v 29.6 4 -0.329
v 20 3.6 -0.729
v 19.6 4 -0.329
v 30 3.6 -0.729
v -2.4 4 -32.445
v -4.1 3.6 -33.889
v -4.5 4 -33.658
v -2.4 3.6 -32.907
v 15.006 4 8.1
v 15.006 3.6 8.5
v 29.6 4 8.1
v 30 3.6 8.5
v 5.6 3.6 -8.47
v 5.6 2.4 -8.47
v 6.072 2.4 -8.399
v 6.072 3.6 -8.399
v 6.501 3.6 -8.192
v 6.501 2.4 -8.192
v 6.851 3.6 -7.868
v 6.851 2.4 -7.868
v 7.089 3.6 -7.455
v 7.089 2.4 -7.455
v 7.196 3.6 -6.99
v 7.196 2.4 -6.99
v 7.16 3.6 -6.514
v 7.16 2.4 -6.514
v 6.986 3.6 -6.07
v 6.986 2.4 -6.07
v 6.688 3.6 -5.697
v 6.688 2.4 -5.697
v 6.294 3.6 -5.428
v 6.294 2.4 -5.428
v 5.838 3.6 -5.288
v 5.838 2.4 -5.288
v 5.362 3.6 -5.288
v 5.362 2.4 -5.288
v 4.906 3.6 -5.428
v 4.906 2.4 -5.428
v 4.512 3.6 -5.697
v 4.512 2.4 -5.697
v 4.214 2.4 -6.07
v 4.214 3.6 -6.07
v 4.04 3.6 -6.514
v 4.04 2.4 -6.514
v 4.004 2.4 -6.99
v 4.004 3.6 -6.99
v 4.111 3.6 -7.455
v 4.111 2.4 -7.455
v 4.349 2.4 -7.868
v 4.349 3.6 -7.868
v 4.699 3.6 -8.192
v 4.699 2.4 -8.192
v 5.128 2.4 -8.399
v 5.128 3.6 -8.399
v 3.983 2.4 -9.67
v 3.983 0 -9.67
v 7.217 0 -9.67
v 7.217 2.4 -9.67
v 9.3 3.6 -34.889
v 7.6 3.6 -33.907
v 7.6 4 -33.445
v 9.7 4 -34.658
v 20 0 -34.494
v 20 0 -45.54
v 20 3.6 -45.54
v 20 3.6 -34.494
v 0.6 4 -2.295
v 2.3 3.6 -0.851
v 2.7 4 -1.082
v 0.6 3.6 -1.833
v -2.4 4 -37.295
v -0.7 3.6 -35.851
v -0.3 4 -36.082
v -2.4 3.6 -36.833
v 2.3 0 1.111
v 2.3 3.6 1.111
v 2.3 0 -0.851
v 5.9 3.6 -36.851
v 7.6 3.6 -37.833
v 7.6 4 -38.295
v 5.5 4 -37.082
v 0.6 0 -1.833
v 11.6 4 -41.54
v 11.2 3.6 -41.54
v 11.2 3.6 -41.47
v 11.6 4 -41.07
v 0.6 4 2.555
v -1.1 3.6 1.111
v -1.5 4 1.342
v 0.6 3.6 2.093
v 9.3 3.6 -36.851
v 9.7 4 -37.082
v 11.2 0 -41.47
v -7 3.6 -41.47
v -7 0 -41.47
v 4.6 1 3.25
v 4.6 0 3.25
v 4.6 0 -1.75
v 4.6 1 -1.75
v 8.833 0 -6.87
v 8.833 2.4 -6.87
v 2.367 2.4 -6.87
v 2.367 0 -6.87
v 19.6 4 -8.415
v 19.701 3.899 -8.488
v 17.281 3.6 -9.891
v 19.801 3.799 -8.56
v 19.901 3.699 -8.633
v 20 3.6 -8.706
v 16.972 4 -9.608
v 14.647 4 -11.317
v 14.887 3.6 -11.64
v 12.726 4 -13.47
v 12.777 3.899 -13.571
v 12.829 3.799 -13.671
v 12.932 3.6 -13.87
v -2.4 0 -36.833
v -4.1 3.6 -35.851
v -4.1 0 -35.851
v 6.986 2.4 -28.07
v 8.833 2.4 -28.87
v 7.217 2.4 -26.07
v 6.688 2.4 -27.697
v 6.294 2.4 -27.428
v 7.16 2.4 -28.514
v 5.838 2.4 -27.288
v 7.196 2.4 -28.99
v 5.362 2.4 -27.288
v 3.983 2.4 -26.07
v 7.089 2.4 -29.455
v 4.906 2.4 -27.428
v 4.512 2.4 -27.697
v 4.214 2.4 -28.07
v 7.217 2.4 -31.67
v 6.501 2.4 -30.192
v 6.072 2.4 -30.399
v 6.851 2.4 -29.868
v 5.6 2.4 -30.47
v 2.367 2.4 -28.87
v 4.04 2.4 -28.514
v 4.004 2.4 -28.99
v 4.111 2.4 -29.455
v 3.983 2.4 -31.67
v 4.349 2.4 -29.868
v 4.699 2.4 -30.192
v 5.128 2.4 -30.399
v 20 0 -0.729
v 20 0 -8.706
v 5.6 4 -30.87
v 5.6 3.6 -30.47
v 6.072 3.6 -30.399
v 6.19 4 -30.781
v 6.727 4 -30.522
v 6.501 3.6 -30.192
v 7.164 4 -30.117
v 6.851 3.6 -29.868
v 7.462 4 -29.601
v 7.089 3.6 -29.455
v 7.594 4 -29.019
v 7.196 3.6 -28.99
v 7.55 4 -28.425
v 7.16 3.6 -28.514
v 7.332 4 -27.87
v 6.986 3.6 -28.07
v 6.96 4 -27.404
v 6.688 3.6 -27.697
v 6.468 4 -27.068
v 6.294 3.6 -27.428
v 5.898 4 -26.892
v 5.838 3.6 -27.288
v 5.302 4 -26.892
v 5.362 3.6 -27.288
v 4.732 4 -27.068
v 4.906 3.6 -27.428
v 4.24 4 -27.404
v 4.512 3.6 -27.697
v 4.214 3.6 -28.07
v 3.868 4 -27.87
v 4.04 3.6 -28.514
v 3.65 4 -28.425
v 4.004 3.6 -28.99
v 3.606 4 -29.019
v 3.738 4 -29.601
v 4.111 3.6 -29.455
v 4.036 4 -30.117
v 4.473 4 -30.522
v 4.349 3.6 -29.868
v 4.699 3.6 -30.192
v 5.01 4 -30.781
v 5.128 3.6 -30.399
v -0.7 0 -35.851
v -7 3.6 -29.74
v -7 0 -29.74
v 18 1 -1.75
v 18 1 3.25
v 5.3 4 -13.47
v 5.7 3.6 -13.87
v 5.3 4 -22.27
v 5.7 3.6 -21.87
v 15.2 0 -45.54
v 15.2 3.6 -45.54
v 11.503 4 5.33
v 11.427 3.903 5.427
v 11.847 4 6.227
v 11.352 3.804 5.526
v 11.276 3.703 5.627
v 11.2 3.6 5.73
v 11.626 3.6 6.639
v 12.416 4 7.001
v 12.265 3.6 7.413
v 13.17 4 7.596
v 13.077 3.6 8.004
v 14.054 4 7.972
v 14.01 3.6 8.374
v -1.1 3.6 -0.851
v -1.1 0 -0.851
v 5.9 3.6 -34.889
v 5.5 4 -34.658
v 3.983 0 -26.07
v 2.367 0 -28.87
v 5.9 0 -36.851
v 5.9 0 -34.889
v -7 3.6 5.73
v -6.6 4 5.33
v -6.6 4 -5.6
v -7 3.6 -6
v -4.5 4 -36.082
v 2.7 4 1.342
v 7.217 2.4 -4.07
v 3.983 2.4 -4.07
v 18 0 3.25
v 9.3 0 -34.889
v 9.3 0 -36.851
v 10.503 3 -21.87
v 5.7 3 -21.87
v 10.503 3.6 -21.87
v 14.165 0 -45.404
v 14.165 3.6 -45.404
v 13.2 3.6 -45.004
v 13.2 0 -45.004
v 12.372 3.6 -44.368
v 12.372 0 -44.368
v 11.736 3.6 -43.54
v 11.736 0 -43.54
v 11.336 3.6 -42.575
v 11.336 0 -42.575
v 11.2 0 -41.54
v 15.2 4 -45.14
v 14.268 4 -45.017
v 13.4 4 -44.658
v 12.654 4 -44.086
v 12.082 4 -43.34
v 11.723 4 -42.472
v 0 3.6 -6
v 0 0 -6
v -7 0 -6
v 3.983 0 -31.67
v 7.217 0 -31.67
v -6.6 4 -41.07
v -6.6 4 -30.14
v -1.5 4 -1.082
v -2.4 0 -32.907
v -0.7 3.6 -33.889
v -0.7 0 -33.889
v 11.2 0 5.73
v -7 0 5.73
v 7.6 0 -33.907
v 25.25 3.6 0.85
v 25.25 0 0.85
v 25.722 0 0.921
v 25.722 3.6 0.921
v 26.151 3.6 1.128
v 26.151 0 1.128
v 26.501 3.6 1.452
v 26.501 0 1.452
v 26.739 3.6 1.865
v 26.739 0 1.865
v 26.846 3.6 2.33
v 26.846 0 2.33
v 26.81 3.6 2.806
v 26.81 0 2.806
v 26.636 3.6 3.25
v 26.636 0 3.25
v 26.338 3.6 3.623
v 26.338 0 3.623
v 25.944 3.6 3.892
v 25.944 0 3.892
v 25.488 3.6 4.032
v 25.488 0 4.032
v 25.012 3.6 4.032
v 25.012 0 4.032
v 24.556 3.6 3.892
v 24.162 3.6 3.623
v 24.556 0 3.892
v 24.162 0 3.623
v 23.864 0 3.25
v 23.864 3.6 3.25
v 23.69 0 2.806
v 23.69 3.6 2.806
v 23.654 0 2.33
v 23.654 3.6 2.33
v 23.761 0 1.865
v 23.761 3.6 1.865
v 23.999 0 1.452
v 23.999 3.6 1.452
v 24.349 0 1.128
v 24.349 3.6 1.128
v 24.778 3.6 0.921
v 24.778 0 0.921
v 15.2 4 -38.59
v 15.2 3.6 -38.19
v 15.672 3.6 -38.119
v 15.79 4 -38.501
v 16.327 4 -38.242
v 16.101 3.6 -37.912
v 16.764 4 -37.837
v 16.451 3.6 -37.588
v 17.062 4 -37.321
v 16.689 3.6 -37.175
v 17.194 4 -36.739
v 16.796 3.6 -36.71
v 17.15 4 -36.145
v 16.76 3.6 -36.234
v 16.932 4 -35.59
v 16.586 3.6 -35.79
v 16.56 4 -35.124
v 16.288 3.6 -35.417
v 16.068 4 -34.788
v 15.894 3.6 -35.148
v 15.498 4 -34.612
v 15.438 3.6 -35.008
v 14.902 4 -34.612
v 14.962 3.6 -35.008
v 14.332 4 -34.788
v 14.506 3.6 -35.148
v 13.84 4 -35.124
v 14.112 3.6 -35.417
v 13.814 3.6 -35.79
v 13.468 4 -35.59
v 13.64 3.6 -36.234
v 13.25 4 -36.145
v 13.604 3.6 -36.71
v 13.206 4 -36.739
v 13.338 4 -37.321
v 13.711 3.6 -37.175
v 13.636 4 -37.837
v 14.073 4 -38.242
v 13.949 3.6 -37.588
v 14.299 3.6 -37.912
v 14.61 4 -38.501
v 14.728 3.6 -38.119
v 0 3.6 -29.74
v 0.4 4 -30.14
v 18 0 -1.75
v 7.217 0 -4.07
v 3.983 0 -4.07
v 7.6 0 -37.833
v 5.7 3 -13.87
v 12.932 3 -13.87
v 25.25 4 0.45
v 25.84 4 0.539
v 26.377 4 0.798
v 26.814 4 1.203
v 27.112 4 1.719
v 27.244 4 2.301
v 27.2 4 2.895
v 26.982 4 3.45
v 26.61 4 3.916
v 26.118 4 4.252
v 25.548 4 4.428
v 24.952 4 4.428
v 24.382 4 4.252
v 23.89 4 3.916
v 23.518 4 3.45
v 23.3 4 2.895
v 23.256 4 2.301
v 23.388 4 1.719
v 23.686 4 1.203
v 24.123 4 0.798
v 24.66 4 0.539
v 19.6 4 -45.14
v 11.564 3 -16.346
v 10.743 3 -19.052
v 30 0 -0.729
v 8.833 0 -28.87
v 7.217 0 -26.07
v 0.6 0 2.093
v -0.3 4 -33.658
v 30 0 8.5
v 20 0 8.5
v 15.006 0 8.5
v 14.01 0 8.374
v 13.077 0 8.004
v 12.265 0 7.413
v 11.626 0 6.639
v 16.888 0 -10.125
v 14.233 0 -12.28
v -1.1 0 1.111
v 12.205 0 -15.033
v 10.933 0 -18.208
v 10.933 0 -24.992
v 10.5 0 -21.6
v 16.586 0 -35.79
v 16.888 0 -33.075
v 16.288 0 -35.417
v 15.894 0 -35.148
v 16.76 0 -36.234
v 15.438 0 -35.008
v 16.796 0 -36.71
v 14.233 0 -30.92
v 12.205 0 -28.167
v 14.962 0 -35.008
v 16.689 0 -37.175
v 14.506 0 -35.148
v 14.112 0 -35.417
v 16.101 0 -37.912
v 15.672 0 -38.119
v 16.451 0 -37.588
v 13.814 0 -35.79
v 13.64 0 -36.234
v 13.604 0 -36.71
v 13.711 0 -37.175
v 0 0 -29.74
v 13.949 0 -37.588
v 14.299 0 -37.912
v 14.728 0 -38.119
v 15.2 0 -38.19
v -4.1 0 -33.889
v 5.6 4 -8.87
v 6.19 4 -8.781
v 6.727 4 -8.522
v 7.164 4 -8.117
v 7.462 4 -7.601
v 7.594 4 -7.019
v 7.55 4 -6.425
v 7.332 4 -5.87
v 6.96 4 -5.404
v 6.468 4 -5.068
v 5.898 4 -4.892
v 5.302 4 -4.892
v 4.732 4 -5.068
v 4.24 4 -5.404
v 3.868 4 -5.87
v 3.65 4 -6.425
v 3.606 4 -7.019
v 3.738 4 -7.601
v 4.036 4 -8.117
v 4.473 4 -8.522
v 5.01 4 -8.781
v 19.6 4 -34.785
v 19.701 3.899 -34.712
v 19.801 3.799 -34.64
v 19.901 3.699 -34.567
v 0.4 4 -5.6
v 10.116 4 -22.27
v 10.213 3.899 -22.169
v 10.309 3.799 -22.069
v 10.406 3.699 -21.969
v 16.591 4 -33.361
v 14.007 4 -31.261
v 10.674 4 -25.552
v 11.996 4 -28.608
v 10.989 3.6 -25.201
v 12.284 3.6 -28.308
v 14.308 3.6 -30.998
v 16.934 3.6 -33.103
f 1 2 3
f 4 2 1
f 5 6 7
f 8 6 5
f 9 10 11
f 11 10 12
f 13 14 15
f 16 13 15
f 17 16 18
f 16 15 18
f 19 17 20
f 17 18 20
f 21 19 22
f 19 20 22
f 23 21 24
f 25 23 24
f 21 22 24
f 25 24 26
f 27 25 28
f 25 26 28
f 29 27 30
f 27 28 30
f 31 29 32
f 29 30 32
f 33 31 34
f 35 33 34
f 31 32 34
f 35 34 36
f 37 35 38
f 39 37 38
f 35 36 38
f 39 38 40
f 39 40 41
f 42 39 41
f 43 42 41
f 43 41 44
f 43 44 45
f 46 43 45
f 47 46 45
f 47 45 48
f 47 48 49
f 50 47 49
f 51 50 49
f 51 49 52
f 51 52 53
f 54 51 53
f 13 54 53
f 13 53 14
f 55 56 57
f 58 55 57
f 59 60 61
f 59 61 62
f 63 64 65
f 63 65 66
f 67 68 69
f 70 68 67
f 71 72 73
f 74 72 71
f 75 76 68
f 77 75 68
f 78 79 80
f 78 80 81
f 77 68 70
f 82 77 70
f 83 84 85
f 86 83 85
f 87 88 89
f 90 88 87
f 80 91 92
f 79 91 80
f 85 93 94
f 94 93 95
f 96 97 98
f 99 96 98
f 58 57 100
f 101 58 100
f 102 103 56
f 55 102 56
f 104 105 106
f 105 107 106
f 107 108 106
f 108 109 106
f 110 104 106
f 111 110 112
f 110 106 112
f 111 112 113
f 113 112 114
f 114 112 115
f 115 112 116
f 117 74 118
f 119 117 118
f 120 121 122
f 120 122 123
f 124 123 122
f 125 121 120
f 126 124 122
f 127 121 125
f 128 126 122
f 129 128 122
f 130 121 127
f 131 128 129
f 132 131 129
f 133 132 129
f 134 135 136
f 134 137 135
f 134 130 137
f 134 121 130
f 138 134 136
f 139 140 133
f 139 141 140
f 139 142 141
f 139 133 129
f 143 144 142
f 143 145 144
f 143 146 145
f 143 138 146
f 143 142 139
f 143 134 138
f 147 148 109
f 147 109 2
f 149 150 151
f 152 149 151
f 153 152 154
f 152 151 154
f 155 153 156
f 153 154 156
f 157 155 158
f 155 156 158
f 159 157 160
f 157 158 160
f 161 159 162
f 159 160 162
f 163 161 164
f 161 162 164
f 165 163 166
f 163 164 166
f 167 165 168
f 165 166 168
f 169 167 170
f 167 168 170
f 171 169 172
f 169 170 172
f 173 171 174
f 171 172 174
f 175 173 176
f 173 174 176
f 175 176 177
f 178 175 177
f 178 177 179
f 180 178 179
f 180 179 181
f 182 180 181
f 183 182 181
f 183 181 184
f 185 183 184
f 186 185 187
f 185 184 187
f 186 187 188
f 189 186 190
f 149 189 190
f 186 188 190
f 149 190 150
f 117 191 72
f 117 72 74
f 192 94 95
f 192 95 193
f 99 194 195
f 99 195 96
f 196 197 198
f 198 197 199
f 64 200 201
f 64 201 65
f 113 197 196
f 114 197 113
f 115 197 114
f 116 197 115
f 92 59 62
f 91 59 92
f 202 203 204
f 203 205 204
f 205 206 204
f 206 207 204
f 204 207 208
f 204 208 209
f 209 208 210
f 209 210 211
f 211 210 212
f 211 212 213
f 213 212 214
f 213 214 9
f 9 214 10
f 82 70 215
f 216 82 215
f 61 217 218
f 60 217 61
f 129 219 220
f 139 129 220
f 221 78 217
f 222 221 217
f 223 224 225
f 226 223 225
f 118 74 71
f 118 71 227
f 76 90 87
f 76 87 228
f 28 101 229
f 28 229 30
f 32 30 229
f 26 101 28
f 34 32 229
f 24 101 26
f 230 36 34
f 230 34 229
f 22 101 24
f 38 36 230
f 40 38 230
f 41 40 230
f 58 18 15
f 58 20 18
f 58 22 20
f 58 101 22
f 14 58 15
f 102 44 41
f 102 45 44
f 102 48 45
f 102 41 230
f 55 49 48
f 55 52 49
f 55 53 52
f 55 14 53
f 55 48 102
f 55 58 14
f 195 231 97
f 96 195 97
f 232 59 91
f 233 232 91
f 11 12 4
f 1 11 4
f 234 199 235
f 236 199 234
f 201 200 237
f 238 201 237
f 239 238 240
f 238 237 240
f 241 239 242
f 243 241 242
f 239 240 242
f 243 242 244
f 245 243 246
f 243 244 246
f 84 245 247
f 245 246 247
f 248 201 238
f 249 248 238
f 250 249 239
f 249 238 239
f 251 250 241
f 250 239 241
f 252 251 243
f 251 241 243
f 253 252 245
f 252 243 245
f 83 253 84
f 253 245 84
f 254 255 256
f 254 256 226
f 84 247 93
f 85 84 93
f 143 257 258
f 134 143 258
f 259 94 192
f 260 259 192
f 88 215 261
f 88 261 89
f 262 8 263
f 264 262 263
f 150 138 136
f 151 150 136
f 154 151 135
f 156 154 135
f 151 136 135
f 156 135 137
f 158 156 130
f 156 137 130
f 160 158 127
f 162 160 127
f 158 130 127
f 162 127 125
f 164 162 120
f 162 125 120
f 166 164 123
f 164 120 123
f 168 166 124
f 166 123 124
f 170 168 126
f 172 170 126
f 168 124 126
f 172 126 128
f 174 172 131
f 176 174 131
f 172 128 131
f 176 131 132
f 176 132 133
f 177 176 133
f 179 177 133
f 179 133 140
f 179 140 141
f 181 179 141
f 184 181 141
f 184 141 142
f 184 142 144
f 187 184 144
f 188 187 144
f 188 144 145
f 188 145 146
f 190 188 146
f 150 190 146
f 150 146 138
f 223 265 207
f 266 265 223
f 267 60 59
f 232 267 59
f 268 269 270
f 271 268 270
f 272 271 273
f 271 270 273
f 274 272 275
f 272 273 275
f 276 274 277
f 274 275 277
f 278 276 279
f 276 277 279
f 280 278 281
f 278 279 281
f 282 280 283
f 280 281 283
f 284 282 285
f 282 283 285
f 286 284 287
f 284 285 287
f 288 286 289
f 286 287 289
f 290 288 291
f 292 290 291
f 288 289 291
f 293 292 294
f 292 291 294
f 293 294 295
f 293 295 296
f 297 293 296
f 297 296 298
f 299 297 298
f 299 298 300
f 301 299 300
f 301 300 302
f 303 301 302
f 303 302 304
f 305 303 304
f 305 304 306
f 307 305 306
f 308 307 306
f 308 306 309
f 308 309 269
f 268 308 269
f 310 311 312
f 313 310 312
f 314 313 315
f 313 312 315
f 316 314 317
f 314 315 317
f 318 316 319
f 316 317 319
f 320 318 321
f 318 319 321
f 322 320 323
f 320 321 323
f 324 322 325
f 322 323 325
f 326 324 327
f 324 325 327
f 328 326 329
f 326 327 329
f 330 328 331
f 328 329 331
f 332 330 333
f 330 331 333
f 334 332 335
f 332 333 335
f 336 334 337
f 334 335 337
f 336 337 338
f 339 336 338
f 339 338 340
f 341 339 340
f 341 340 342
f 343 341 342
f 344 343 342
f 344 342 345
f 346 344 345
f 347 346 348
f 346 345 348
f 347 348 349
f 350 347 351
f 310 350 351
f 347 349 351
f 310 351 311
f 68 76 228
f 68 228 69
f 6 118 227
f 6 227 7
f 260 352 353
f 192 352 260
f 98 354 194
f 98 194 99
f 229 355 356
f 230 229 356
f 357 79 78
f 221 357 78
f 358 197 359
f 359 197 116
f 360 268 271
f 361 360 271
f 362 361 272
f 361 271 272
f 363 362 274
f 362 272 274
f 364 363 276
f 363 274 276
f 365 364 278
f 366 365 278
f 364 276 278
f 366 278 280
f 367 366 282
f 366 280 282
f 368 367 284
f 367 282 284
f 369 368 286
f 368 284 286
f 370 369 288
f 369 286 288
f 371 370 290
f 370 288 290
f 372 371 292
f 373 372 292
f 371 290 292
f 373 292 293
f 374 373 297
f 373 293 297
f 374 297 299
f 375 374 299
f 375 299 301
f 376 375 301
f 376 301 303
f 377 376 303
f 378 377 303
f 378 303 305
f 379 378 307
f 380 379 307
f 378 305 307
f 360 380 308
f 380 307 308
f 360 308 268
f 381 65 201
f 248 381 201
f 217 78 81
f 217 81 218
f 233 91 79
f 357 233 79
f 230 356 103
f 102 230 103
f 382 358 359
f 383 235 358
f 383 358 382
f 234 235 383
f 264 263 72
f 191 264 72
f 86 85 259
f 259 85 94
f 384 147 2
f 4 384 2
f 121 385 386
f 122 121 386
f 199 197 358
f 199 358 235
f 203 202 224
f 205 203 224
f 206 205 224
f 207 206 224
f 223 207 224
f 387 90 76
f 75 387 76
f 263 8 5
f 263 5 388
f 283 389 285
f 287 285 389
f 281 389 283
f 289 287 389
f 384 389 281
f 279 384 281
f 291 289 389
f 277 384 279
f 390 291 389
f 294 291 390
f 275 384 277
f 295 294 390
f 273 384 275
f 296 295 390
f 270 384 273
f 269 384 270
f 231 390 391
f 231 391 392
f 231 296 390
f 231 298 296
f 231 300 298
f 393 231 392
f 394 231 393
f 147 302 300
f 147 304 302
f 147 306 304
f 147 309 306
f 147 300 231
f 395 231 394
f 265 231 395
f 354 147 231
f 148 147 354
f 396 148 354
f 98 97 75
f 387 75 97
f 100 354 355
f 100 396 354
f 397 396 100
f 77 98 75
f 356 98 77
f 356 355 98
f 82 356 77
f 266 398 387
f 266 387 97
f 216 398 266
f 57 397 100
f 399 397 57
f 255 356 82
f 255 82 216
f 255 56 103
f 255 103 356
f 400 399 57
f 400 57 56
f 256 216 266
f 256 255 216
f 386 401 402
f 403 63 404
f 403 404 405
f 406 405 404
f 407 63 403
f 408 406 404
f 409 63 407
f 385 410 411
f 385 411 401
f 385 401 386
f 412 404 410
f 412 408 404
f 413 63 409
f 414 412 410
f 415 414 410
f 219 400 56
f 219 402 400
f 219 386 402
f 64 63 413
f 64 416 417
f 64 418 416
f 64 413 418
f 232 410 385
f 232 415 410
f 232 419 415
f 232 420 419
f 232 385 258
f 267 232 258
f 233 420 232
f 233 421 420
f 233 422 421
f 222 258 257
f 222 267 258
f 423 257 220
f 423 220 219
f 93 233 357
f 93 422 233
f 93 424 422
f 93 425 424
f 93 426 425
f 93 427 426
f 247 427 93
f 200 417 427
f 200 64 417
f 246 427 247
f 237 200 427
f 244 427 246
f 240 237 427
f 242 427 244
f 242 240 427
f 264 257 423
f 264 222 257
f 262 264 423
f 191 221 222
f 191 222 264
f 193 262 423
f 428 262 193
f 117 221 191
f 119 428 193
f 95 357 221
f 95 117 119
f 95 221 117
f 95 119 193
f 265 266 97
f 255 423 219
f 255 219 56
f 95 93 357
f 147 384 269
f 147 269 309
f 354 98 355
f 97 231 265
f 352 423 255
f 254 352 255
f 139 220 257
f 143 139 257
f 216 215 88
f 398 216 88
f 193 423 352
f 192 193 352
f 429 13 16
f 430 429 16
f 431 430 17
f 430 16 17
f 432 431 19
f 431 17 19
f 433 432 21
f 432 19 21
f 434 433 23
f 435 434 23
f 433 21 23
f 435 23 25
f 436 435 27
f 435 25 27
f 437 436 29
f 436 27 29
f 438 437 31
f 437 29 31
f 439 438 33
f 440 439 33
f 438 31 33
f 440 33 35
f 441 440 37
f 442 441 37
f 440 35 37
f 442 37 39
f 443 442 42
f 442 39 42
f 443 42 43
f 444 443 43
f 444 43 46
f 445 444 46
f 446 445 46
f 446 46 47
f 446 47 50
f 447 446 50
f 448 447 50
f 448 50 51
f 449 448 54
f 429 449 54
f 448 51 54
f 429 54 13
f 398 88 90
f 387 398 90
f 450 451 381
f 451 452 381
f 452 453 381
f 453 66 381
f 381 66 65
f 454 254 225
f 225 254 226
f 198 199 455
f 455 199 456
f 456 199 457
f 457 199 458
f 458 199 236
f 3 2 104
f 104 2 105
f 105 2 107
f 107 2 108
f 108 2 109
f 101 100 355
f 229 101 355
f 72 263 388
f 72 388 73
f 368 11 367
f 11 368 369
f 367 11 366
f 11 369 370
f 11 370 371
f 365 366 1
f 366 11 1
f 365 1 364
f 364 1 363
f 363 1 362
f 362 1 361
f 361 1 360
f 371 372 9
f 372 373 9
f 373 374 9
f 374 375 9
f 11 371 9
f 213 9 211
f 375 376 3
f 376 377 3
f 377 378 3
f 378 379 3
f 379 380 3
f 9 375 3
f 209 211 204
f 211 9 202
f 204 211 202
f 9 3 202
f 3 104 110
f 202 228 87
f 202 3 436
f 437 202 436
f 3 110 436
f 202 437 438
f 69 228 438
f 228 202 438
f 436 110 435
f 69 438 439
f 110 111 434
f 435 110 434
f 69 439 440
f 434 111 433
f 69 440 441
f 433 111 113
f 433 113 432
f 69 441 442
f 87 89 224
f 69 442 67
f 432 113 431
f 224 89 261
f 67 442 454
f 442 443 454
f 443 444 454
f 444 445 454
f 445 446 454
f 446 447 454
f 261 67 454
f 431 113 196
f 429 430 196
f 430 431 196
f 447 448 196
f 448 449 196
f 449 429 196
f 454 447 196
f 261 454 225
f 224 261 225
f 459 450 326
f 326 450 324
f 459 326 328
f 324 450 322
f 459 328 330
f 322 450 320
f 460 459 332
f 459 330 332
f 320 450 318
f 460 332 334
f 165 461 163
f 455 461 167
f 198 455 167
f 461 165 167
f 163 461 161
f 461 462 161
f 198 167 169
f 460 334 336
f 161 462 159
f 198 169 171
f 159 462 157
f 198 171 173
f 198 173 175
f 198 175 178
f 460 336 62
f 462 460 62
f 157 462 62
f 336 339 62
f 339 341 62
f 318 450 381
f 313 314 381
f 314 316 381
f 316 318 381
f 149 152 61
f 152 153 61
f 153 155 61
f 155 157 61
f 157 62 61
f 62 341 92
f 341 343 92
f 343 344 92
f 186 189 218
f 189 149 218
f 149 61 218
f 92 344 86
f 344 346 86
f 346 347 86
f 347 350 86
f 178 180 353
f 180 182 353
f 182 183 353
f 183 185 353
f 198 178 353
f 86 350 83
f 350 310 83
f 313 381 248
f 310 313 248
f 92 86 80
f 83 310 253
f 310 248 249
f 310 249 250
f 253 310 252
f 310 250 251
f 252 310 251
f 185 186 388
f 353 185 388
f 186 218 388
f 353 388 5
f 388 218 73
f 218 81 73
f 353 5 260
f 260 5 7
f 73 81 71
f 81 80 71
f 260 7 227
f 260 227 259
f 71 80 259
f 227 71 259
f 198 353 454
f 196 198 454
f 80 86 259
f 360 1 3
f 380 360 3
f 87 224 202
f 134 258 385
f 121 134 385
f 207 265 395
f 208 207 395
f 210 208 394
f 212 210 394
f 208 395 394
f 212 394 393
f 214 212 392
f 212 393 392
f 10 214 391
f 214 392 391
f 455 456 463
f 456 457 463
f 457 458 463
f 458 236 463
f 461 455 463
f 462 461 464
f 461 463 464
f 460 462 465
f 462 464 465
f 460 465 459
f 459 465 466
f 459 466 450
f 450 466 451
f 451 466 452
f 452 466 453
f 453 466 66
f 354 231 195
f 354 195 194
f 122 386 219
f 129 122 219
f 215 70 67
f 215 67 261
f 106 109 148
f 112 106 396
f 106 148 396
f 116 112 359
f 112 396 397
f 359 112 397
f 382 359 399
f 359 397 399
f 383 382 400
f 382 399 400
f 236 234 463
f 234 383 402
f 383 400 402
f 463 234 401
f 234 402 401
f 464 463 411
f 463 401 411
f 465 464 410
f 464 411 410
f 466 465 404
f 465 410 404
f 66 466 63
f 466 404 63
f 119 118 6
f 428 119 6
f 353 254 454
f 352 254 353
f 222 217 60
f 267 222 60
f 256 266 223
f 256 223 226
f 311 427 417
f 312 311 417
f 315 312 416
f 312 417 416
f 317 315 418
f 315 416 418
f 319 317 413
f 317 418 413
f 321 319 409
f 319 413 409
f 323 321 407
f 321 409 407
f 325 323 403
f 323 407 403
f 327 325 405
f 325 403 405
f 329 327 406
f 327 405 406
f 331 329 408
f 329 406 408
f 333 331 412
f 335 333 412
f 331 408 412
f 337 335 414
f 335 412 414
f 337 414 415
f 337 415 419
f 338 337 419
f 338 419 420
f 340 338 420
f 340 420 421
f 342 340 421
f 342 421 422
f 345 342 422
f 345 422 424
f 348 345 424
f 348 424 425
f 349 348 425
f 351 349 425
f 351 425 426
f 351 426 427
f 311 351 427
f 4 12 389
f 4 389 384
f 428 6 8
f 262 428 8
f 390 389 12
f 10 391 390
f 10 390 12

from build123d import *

# Parameters (mm, degrees)
SKETCH_1_W           = 20
SKETCH_1_H           = 35.74
EXTRUDE_1_DEPTH      = 4
SKETCH_2_W           = 8.8
SKETCH_2_H           = 8.5
SKETCH_2_H_2         = 9.8
EXTRUDE_2_DEPTH      = 4
SKETCH_3_R           = 13.5
CUT_EXTRUDE_1_DEPTH  = 10
SKETCH_4_W           = 9
SKETCH_4_H           = 5
CUT_EXTRUDE_2_DEPTH  = 1
SKETCH_5_W           = 9.228972975
SKETCH_5_H           = 4
EXTRUDE_3_DEPTH      = 10
SKETCH_6_R           = 1.6
CUT_EXTRUDE_3_DEPTH  = 10
SKETCH_7_R           = 1.6
CUT_EXTRUDE_4_DEPTH  = 55.679901244
SKETCH_8_W           = 11.2
SKETCH_8_H           = 4
EXTRUDE_4_DEPTH      = 4
SKETCH_9_R           = 1.65
CUT_EXTRUDE_5_DEPTH  = 55.679901244
SKETCH_10_W          = 10
SKETCH_10_H          = 4
EXTRUDE_5_DEPTH      = 7
SKETCH_11_R          = 1.65
CUT_EXTRUDE_6_DEPTH  = 8
SKETCH_12_W          = 6.6
SKETCH_12_H          = 5
CUT_EXTRUDE_7_DEPTH  = 1
SKETCH_13_R          = 1.55
CUT_EXTRUDE_8_DEPTH  = 5
SKETCH_14_W          = 18.2
SKETCH_14_H          = 1.73
EXTRUDE_6_DEPTH      = 4
SKETCH_16_W          = 10
SKETCH_16_H          = 8
CUT_EXTRUDE_9_DEPTH  = 1
CUT_EXTRUDE_10_DEPTH = 2.4
FILLET_1_R           = 4
CUT_EXTRUDE_11_DEPTH = 55.679901244
CHAMFER_1_SIZE       = 0.4


with BuildPart() as part:
    # 草图1 → 凸台-拉伸1 (new body)
    with BuildSketch(Plane(origin=(0, 0, 0), x_dir=(1, 0, 0), z_dir=(0, 1, 0))):
        with Locations((10, 17.87)):
            Rectangle(SKETCH_1_W, SKETCH_1_H)
    extrude(amount=EXTRUDE_1_DEPTH)

    # 草图2 → 凸台-拉伸2 (add)
    with BuildSketch(Plane.XZ):
        with Locations((15.6, 4.25)):
            Rectangle(SKETCH_2_W, SKETCH_2_H)
        with Locations((15.6, -40.64)):
            Rectangle(SKETCH_2_W, SKETCH_2_H_2)
    extrude(amount=-EXTRUDE_2_DEPTH)

    # 草图3 → 切除-拉伸1 (cut)
    with BuildSketch(Plane(origin=(0, 0, 0), x_dir=(-1, 0, 0), z_dir=(0, -1, 0))):
        with Locations((-24, 21.6)):
            Circle(SKETCH_3_R)
    extrude(amount=-CUT_EXTRUDE_1_DEPTH, mode=Mode.SUBTRACT)

    # 草图4 → 切除-拉伸2 (cut)
    with BuildSketch(Plane(origin=(0, 0, 0), x_dir=(-1, 0, 0), z_dir=(0, -1, 0))):
        with Locations((-13.5, -0.75)):
            Rectangle(SKETCH_4_W, SKETCH_4_H)
    extrude(amount=-CUT_EXTRUDE_2_DEPTH, mode=Mode.SUBTRACT)

    # 草图5 → 凸台-拉伸3 (add)
    with BuildSketch(Plane(origin=(20, 0, 0), x_dir=(0, 0, -1), z_dir=(1, 0, 0))):
        with Locations((-3.885513513, 2)):
            Rectangle(SKETCH_5_W, SKETCH_5_H)
    extrude(amount=EXTRUDE_3_DEPTH)

    # 草图6 → 切除-拉伸3 (cut)
    with BuildSketch(Plane(origin=(0, 0, 0), x_dir=(-1, 0, 0), z_dir=(0, -1, 0))):
        with Locations(Location((-15.2, 36.59, 0), (0, 0, 90))):
            Circle(SKETCH_6_R)
        with Locations(Location((-25.25, -2.45, 0), (0, 0, 90))):
            Circle(SKETCH_6_R)
    extrude(amount=-CUT_EXTRUDE_3_DEPTH, mode=Mode.SUBTRACT)

    # 草图7 → 切除-拉伸4 (cut, through all)
    with BuildSketch(Plane(origin=(0, 0, 0), x_dir=(-1, 0, 0), z_dir=(0, -1, 0))):
        with Locations(Location((-5.6, 28.87, 0), (0, 0, 90))):
            Circle(SKETCH_7_R)
        with Locations(Location((-5.6, 6.87, 0), (0, 0, 90))):
            Circle(SKETCH_7_R)
    extrude(amount=-CUT_EXTRUDE_4_DEPTH, mode=Mode.SUBTRACT)

    # 草图8 → 凸台-拉伸4 (add)
    with BuildSketch(Plane.XZ):
        with Locations((5.6, -37.74)):
            Rectangle(SKETCH_8_W, SKETCH_8_H)
        with Locations((5.6, 2)):
            Rectangle(SKETCH_8_W, SKETCH_8_H)
    extrude(amount=-EXTRUDE_4_DEPTH)

    # 草图9 → 切除-拉伸5 (cut, through all)
    with BuildSketch(Plane(origin=(0, 0, 0), x_dir=(-1, 0, 0), z_dir=(0, -1, 0))):
        with Locations(Location((-7.6, 35.87, 0), (0, 0, 90))):
            Circle(SKETCH_9_R)
        with Locations((-0.6, -0.13)):
            Circle(SKETCH_9_R)
    extrude(amount=-CUT_EXTRUDE_5_DEPTH, mode=Mode.SUBTRACT)

    # 草图10 → 凸台-拉伸5 (add)
    with BuildSketch(Plane.ZY):
        with Locations((-34.74, 2)):
            Rectangle(SKETCH_10_W, SKETCH_10_H)
        with Locations((-1, 2)):
            Rectangle(SKETCH_10_W, SKETCH_10_H)
    extrude(amount=EXTRUDE_5_DEPTH)

    # 草图11 → 切除-拉伸6 (cut)
    with BuildSketch(Plane(origin=(0, 0, 0), x_dir=(-1, 0, 0), z_dir=(0, -1, 0))):
        with Locations(Location((2.4, 34.87, 0), (0, 0, 90))):
            Circle(SKETCH_11_R)
    extrude(amount=-CUT_EXTRUDE_6_DEPTH, mode=Mode.SUBTRACT)

    # 草图12 → 切除-拉伸7 (cut)
    with BuildSketch(Plane(origin=(0, 0, 0), x_dir=(-1, 0, 0), z_dir=(0, -1, 0))):
        with Locations((-7.9, -0.75)):
            Rectangle(SKETCH_12_W, SKETCH_12_H)
    extrude(amount=-CUT_EXTRUDE_7_DEPTH, mode=Mode.SUBTRACT)

    # 草图13 → 切除-拉伸8 (cut)
    with BuildSketch(Plane(origin=(0, 0, 0), x_dir=(-1, 0, 0), z_dir=(0, -1, 0))):
        with Locations((-0.6, -0.13)):
            Circle(SKETCH_13_R)
    extrude(amount=-CUT_EXTRUDE_8_DEPTH, mode=Mode.SUBTRACT)

    # 草图14 → 凸台-拉伸6 (add)
    with BuildSketch(Plane(origin=(0, 0, 0), x_dir=(-1, 0, 0), z_dir=(0, -1, 0))):
        with Locations((-2.1, -4.865)):
            Rectangle(SKETCH_14_W, SKETCH_14_H)
        with Locations((-2.1, 40.605)):
            Rectangle(SKETCH_14_W, SKETCH_14_H)
    extrude(amount=-EXTRUDE_6_DEPTH)

    # 草图16 → 切除-拉伸9 (cut)
    with BuildSketch(Plane(origin=(0, 4, 0), x_dir=(1, 0, 0), z_dir=(0, 1, 0))):
        with Locations((10.7, 17.87)):
            Rectangle(SKETCH_16_W, SKETCH_16_H)
    extrude(amount=-CUT_EXTRUDE_9_DEPTH, mode=Mode.SUBTRACT)

    # 草图17 → 切除-拉伸10 (cut)
    with BuildSketch(Plane(origin=(0, 0, 0), x_dir=(-1, 0, 0), z_dir=(0, -1, 0))):
        Polygon((-8.833161507, 28.87), (-7.216580754, 26.07), (-3.983419246, 26.07), (-2.366838493, 28.87), (-3.983419246, 31.67), (-7.216580754, 31.67), align=None)
        Polygon((-8.833161507, 6.87), (-7.216580754, 4.07), (-3.983419246, 4.07), (-2.366838493, 6.87), (-3.983419246, 9.67), (-7.216580754, 9.67), align=None)
    extrude(amount=-CUT_EXTRUDE_10_DEPTH, mode=Mode.SUBTRACT)

    # 圆角1
    # the kernel refuses this fillet: 4 mm, written as the material it takes off along each edge
    with BuildSketch(Plane(origin=(11.2, -9.515480808, 8.5), x_dir=(1, 0, 0), z_dir=(0, 1, 0))) as fillet_1_piece_1:
        with BuildLine():
            CenterArc((3.806192323, 4), FILLET_1_R, 197.908633295, 72.091366705)
            Line((0, 2.77), (-0.076123846, 2.7454))
            ThreePointArc((-0.076123846, 2.7454), (-0.08, 1.385), (-0.08, 0))
            Line((-0.08, 0), (0, -0.08))
            Line((0, -0.08), (3.806192323, -0.08))
            Line((3.806192323, -0.08), (3.806192323, 0))
        make_face()
    extrude(amount=23.030961615, mode=Mode.SUBTRACT)
    with BuildSketch(Plane(origin=(11.2, -10, -45.54), x_dir=(0, 0, 1), z_dir=(0, 1, 0))) as fillet_1_piece_2:
        with BuildLine():
            CenterArc((FILLET_1_R, FILLET_1_R), FILLET_1_R, 180, 90)
            Line((0, FILLET_1_R), (-FILLET_1_R * 0.02, FILLET_1_R))
            Line((-FILLET_1_R * 0.02, FILLET_1_R), (-FILLET_1_R * 0.02, -FILLET_1_R * 0.02))
            Line((-FILLET_1_R * 0.02, -FILLET_1_R * 0.02), (FILLET_1_R, -FILLET_1_R * 0.02))
            Line((FILLET_1_R, -FILLET_1_R * 0.02), (FILLET_1_R, 0))
        make_face()
    extrude(amount=24, mode=Mode.SUBTRACT)

    # 草图19 → 切除-拉伸11 (cut, through all)
    with BuildSketch(Plane(origin=(0, 4, 0), x_dir=(1, 0, 0), z_dir=(0, 1, 0))):
        Polygon((0.6, -2.092990915), (2.3, -1.111495458), (2.3, 0.851495458), (0.6, 1.832990915), (-1.1, 0.851495458), (-1.1, -1.111495458), align=None)
        Polygon((-2.4, 32.907009085), (-0.7, 33.888504542), (-0.7, 35.851495458), (-2.4, 36.832990915), (-4.1, 35.851495458), (-4.1, 33.888504542), align=None)
        Polygon((7.6, 33.907009085), (9.3, 34.888504542), (9.3, 36.851495458), (7.6, 37.832990915), (5.9, 36.851495458), (5.9, 34.888504542), align=None)
    extrude(amount=-CUT_EXTRUDE_11_DEPTH, mode=Mode.SUBTRACT)

    # 倒角1
    chamfer_1_edges = [part.edges().sort_by_distance(p)[0] for p in [
        (5.6, 4, -5.27),
        (0, 4, -17.87),
        (-3.5, 4, -29.74),
        (-7, 4, -35.605),
        (22.503096162, 4, 8.5),
        (-3.5, 4, -6),
        (-7, 4, -0.135),
        (2.1, 4, 5.73),
        (11.2, 4, -41.505),
        (2.1, 4, -41.47),
        (13.212093026, 4, -29.716099009),
        (8.101350135, 4, -21.87),
        (5.7, 4, -17.87),
        (9.316079599, 4, -13.87),
        (17.6, 4, -45.54),
        (12.371572875, 4, -44.368427125),
        (12.652471864, 4, 7.734192326),
        (-0.25, 4, 1.602243186),
        (1.45, 4, 1.602243186),
        (2.3, 4, 0.13),
        (1.45, 4, -1.342243186),
        (-0.25, 4, -1.342243186),
        (-1.1, 4, 0.13),
        (-3.25, 4, -33.397756814),
        (-1.55, 4, -33.397756814),
        (-0.7, 4, -34.87),
        (-1.55, 4, -36.342243186),
        (-3.25, 4, -36.342243186),
        (-4.1, 4, -34.87),
        (6.75, 4, -34.397756814),
        (8.45, 4, -34.397756814),
        (9.3, 4, -35.87),
        (8.45, 4, -37.342243186),
        (6.75, 4, -37.342243186),
        (5.9, 4, -35.87),
        (20, 4, -40.016898479),
        (16.035945985, 4, -10.699364989),
        (20, 4, -4.717588008),
        (25, 4, -0.728972975),
        (30, 4, 3.885513513),
        (15.2, 4, -34.99),
        (25.25, 4, 4.05),
        (5.6, 4, -27.27),
    ]]
    chamfer(chamfer_1_edges, length=CHAMFER_1_SIZE)


solid = part.part
